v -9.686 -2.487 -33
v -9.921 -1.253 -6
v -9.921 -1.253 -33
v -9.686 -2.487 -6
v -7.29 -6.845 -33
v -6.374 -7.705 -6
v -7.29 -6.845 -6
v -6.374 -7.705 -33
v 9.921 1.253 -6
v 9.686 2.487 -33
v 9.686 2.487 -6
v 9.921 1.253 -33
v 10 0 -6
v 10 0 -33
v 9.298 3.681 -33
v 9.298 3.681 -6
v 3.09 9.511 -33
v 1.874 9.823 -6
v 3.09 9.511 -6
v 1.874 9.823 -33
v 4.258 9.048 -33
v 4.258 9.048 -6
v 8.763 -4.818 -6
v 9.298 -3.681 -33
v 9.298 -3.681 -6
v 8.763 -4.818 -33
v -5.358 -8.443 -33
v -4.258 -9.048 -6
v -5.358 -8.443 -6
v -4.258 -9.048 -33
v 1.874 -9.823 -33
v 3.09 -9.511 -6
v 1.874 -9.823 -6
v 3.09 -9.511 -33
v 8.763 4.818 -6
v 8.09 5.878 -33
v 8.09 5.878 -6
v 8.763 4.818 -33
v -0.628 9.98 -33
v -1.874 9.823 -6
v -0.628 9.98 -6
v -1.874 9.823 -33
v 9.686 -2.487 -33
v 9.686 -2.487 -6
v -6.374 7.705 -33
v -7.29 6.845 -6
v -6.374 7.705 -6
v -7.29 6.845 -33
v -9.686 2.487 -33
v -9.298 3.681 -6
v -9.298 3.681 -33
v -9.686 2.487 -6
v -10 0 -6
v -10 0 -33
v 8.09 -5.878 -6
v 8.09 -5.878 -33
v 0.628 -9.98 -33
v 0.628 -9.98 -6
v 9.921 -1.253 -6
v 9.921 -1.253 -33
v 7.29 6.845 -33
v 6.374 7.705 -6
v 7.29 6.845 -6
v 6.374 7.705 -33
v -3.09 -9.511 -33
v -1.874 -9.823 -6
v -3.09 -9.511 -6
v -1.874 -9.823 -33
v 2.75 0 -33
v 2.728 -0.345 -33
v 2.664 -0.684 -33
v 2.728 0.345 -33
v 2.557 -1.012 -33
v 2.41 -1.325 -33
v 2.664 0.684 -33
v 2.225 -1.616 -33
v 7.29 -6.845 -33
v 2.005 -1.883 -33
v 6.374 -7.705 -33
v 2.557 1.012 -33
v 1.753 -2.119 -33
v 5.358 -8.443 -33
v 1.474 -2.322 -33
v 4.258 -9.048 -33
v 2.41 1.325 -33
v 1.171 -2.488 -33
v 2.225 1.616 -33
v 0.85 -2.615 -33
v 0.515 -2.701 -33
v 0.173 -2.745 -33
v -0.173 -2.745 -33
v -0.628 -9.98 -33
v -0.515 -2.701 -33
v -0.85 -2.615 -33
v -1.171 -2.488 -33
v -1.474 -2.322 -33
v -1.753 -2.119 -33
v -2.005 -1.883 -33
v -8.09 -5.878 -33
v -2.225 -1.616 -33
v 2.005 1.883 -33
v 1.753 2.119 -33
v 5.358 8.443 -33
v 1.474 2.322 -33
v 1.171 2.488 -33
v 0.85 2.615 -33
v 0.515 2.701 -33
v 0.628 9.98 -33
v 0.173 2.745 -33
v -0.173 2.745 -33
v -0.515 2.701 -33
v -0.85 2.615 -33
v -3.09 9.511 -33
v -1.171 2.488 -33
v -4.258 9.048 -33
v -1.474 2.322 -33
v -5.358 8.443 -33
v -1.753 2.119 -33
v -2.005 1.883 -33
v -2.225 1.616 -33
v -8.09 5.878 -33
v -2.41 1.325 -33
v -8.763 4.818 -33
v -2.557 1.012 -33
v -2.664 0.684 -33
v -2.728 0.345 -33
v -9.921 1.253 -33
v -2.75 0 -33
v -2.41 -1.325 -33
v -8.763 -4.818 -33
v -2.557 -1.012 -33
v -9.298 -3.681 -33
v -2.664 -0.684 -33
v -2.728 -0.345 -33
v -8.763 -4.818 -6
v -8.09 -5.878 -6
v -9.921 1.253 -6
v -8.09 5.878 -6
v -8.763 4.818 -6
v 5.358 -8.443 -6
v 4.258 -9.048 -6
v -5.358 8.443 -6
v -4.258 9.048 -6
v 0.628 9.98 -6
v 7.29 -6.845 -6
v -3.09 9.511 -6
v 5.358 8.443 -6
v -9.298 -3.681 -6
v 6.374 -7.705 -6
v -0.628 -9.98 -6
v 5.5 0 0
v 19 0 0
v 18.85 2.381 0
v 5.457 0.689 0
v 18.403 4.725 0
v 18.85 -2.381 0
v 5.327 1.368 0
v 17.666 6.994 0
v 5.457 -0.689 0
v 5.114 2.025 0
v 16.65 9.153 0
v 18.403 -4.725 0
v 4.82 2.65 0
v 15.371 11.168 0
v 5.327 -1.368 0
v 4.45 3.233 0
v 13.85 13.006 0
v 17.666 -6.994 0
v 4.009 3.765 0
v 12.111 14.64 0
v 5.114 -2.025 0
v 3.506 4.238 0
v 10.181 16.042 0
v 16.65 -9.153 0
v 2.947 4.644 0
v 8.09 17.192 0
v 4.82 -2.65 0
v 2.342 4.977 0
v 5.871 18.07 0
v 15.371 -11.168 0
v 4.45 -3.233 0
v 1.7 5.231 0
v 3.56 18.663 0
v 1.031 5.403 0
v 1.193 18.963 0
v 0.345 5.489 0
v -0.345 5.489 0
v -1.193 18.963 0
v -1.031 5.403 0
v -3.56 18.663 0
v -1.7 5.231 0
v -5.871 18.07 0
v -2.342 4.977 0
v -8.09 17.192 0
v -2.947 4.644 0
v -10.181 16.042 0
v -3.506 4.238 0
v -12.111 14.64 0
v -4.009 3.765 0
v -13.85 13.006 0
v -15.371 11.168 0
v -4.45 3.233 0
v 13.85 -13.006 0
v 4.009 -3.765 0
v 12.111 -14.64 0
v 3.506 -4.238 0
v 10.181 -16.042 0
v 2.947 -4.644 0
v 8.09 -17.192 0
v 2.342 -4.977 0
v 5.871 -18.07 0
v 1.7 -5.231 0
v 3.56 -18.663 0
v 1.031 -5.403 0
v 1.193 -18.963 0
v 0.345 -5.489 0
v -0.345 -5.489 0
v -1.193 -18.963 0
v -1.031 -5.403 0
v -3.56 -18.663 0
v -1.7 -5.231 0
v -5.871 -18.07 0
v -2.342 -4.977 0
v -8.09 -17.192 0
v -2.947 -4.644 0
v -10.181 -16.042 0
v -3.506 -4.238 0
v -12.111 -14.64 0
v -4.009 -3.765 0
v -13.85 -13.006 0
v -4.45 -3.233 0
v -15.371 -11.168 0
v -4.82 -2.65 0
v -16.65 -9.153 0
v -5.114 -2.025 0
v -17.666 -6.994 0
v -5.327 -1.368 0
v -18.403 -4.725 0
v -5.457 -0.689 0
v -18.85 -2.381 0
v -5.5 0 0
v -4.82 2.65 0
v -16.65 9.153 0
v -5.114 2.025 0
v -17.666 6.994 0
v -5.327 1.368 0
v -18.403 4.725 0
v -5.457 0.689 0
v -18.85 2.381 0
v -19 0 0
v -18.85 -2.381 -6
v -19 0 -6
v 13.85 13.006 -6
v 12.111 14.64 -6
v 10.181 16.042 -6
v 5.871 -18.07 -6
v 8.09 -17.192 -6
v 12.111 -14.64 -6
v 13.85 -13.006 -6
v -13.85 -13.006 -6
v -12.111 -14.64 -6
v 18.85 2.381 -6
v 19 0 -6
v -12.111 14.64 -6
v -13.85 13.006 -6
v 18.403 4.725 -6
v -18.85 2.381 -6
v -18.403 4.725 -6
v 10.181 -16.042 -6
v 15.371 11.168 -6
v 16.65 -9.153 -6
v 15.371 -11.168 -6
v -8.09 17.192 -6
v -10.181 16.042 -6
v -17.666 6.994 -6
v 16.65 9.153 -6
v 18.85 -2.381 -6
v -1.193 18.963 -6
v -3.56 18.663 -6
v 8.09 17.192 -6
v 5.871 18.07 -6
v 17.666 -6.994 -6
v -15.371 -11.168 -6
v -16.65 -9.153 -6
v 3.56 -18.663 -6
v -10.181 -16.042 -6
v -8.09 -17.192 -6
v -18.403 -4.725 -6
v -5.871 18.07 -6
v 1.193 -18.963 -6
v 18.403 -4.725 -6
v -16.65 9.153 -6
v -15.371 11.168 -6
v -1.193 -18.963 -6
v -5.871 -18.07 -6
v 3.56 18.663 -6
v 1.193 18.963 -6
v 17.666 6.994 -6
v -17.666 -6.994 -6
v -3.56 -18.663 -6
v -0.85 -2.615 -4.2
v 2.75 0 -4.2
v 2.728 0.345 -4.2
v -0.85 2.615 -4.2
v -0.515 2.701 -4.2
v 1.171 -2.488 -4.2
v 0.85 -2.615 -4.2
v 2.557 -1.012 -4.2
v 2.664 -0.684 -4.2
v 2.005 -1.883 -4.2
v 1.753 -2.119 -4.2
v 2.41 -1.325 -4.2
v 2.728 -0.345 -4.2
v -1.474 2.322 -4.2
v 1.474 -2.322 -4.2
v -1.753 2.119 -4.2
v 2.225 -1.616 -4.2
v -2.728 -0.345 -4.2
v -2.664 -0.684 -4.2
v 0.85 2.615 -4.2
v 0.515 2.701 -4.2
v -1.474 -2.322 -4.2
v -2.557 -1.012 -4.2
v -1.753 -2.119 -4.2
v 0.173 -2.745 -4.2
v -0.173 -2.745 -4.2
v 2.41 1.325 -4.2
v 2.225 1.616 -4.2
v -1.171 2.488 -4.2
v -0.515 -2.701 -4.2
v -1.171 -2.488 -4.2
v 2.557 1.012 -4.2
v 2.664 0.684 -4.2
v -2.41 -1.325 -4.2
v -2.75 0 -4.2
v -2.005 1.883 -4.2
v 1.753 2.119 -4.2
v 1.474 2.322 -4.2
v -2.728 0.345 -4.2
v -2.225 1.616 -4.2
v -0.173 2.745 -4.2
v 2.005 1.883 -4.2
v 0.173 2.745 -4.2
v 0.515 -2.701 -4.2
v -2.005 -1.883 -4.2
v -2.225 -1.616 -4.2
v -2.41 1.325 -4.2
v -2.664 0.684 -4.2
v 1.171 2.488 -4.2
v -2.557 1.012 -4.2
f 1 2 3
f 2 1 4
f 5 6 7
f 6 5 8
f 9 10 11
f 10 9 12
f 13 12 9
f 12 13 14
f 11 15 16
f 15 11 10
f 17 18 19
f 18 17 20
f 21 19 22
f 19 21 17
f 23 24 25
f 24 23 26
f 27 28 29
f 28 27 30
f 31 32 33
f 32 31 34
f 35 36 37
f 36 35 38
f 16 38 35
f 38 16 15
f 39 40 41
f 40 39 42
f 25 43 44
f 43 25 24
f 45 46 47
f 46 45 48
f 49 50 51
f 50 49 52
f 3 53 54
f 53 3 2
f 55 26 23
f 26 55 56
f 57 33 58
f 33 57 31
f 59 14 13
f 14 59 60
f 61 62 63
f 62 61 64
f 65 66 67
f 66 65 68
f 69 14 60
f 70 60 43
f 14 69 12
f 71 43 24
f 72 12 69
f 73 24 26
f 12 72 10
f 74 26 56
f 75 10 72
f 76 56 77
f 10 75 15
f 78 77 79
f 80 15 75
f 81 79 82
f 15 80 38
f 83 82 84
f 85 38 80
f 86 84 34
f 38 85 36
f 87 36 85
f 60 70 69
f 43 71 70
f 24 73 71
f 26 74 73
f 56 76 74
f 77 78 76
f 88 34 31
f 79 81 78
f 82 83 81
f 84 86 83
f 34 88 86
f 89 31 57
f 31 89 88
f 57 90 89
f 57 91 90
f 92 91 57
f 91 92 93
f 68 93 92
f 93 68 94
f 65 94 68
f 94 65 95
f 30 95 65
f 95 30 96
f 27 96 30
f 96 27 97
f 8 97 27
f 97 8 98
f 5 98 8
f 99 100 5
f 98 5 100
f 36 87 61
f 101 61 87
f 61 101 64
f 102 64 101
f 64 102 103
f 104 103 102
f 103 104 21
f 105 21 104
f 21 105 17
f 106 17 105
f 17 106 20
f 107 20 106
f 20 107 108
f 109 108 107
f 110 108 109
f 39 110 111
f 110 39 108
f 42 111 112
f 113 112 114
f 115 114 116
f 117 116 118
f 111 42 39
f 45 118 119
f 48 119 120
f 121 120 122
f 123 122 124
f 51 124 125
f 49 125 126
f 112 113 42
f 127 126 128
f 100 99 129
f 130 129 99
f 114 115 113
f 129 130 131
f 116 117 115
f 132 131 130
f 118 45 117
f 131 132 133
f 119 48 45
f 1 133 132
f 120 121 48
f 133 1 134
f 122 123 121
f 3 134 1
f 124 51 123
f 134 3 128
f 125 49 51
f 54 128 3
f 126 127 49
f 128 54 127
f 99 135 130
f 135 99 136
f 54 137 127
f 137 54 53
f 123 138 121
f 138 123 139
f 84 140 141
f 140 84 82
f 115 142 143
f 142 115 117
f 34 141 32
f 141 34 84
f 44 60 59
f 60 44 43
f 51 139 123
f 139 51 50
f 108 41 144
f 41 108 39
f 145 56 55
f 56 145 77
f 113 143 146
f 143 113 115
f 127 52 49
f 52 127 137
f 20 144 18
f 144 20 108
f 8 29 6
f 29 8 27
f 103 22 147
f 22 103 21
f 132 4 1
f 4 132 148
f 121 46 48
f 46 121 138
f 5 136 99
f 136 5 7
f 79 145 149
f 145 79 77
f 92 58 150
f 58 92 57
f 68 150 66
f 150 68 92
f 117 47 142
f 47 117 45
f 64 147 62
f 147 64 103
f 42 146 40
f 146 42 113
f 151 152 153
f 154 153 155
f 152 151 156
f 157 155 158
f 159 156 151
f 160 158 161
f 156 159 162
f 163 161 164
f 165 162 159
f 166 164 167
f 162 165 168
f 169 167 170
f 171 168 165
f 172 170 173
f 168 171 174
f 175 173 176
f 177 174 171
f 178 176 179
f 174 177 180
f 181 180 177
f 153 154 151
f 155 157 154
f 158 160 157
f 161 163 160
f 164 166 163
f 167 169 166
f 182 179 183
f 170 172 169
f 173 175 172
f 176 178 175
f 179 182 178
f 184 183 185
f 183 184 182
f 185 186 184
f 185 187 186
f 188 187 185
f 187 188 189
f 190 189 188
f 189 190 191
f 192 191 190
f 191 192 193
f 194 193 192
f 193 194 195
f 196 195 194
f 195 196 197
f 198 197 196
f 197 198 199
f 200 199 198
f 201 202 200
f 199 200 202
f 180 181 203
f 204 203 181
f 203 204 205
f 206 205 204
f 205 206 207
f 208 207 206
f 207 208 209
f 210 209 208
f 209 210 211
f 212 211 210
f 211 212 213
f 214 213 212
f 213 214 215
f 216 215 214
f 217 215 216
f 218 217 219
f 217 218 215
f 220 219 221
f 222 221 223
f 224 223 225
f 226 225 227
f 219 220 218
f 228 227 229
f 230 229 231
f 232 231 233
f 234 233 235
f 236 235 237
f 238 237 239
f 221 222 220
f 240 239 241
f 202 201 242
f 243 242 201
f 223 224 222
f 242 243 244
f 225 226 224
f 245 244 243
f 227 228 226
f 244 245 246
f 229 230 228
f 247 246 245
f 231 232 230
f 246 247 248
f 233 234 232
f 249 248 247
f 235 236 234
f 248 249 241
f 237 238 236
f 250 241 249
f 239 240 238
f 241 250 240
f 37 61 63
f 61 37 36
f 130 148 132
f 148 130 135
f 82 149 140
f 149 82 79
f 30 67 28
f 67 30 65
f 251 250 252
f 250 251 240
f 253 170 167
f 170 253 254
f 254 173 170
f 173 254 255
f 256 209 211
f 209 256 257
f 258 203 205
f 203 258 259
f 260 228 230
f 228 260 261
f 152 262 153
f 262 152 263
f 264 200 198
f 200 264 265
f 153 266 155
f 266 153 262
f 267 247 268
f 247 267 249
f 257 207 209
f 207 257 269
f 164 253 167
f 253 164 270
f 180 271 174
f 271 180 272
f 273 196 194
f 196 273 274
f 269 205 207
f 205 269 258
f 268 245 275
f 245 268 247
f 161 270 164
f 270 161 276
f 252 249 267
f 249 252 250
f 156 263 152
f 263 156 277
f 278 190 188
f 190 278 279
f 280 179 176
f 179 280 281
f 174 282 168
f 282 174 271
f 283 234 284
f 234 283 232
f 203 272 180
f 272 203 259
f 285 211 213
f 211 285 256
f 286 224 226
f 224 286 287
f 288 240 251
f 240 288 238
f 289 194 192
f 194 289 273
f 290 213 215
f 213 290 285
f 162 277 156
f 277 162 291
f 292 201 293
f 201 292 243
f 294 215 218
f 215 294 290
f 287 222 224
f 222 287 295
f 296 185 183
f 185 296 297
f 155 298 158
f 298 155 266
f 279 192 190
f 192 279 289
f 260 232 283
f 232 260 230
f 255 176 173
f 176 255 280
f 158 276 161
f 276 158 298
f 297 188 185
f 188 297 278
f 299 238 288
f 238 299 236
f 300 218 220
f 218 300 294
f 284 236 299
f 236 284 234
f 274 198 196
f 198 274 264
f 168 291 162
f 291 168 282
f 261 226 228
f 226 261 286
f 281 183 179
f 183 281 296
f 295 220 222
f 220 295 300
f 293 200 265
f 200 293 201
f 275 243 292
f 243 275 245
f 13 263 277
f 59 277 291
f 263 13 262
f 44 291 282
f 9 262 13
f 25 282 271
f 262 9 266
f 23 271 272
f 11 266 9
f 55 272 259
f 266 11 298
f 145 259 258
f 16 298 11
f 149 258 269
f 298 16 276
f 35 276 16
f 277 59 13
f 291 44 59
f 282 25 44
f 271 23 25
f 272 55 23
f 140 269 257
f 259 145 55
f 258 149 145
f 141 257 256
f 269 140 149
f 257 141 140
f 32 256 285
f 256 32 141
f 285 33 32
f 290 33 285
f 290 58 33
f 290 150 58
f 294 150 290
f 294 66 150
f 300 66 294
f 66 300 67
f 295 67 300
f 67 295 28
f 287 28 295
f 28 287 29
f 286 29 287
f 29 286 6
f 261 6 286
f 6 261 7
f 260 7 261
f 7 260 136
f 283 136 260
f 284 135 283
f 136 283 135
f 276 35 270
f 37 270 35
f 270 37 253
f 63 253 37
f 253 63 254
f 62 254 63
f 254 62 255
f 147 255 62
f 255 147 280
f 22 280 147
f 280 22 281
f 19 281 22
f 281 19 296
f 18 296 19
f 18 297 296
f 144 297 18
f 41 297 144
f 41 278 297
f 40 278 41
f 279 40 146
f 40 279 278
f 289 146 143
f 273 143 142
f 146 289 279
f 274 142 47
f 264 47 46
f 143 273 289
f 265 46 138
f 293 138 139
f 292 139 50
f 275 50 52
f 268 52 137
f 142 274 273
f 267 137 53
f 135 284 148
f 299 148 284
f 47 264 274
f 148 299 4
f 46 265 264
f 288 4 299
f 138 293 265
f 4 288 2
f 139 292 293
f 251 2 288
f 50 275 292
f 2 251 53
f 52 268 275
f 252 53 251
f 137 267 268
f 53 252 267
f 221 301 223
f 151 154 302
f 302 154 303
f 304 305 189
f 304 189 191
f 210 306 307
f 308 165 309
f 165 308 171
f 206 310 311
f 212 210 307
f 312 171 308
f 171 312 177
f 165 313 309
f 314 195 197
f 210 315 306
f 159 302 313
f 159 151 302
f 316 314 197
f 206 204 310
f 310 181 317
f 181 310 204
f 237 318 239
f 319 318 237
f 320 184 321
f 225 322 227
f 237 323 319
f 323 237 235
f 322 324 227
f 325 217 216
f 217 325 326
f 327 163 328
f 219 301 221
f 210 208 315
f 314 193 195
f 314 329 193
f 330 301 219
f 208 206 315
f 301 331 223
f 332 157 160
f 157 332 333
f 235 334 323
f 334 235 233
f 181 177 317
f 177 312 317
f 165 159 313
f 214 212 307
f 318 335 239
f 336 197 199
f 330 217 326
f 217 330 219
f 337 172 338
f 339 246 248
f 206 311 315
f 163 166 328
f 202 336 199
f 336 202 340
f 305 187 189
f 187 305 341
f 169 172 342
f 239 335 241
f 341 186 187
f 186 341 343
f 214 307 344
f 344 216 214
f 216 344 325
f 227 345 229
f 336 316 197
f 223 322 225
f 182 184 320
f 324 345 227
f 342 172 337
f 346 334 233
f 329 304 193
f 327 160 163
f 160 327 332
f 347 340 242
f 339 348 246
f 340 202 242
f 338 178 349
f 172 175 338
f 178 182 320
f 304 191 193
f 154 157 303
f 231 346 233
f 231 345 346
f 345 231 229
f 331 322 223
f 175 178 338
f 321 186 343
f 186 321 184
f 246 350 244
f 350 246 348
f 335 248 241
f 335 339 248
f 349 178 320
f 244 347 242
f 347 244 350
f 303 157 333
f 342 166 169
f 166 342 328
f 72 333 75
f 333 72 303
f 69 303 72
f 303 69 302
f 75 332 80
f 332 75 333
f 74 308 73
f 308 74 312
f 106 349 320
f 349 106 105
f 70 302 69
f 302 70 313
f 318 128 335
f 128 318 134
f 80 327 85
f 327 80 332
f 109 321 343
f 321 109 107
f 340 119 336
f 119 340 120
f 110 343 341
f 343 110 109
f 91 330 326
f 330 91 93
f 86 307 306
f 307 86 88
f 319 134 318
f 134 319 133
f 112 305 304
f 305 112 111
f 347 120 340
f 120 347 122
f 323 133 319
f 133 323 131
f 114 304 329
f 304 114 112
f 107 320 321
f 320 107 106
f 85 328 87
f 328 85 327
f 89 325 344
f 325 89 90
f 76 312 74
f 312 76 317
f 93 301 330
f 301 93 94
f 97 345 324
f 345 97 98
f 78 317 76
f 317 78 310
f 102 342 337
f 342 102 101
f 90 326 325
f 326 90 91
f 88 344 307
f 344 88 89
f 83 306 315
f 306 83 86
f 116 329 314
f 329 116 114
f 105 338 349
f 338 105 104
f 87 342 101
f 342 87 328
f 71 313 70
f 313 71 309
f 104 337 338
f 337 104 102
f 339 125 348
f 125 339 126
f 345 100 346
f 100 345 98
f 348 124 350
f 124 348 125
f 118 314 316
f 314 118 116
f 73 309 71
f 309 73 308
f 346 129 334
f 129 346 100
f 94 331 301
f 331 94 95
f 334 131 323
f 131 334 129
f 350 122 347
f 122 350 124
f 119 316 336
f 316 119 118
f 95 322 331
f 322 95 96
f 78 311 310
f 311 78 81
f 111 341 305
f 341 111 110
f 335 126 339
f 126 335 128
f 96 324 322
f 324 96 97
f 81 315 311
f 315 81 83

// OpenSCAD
$fn = 50;


difference() {
	union() {
		translate(v = [0, 0, -33.0000000000]) {
			cylinder(h = 33, r = 10.0000000000);
		}
		translate(v = [0, 0, -6.0000000000]) {
			cylinder(h = 6, r = 19.0000000000);
		}
	}
	union() {
		translate(v = [0, 0, 0]) {
			rotate(a = [0, 0, 0]) {
				difference() {
					union() {
						#translate(v = [0, 0, -33.0000000000]) {
							cylinder(h = 33, r = 2.2500000000);
						}
						#translate(v = [0, 0, -4.2000000000]) {
							cylinder(h = 4.2000000000, r1 = 2.7500000000, r2 = 5.5000000000);
						}
						#translate(v = [0, 0, -33.0000000000]) {
							cylinder(h = 33, r = 2.7500000000);
						}
						#translate(v = [0, 0, -33.0000000000]) {
							cylinder(h = 33, r = 2.2500000000);
						}
					}
					union();
				}
			}
		}
	}
}
